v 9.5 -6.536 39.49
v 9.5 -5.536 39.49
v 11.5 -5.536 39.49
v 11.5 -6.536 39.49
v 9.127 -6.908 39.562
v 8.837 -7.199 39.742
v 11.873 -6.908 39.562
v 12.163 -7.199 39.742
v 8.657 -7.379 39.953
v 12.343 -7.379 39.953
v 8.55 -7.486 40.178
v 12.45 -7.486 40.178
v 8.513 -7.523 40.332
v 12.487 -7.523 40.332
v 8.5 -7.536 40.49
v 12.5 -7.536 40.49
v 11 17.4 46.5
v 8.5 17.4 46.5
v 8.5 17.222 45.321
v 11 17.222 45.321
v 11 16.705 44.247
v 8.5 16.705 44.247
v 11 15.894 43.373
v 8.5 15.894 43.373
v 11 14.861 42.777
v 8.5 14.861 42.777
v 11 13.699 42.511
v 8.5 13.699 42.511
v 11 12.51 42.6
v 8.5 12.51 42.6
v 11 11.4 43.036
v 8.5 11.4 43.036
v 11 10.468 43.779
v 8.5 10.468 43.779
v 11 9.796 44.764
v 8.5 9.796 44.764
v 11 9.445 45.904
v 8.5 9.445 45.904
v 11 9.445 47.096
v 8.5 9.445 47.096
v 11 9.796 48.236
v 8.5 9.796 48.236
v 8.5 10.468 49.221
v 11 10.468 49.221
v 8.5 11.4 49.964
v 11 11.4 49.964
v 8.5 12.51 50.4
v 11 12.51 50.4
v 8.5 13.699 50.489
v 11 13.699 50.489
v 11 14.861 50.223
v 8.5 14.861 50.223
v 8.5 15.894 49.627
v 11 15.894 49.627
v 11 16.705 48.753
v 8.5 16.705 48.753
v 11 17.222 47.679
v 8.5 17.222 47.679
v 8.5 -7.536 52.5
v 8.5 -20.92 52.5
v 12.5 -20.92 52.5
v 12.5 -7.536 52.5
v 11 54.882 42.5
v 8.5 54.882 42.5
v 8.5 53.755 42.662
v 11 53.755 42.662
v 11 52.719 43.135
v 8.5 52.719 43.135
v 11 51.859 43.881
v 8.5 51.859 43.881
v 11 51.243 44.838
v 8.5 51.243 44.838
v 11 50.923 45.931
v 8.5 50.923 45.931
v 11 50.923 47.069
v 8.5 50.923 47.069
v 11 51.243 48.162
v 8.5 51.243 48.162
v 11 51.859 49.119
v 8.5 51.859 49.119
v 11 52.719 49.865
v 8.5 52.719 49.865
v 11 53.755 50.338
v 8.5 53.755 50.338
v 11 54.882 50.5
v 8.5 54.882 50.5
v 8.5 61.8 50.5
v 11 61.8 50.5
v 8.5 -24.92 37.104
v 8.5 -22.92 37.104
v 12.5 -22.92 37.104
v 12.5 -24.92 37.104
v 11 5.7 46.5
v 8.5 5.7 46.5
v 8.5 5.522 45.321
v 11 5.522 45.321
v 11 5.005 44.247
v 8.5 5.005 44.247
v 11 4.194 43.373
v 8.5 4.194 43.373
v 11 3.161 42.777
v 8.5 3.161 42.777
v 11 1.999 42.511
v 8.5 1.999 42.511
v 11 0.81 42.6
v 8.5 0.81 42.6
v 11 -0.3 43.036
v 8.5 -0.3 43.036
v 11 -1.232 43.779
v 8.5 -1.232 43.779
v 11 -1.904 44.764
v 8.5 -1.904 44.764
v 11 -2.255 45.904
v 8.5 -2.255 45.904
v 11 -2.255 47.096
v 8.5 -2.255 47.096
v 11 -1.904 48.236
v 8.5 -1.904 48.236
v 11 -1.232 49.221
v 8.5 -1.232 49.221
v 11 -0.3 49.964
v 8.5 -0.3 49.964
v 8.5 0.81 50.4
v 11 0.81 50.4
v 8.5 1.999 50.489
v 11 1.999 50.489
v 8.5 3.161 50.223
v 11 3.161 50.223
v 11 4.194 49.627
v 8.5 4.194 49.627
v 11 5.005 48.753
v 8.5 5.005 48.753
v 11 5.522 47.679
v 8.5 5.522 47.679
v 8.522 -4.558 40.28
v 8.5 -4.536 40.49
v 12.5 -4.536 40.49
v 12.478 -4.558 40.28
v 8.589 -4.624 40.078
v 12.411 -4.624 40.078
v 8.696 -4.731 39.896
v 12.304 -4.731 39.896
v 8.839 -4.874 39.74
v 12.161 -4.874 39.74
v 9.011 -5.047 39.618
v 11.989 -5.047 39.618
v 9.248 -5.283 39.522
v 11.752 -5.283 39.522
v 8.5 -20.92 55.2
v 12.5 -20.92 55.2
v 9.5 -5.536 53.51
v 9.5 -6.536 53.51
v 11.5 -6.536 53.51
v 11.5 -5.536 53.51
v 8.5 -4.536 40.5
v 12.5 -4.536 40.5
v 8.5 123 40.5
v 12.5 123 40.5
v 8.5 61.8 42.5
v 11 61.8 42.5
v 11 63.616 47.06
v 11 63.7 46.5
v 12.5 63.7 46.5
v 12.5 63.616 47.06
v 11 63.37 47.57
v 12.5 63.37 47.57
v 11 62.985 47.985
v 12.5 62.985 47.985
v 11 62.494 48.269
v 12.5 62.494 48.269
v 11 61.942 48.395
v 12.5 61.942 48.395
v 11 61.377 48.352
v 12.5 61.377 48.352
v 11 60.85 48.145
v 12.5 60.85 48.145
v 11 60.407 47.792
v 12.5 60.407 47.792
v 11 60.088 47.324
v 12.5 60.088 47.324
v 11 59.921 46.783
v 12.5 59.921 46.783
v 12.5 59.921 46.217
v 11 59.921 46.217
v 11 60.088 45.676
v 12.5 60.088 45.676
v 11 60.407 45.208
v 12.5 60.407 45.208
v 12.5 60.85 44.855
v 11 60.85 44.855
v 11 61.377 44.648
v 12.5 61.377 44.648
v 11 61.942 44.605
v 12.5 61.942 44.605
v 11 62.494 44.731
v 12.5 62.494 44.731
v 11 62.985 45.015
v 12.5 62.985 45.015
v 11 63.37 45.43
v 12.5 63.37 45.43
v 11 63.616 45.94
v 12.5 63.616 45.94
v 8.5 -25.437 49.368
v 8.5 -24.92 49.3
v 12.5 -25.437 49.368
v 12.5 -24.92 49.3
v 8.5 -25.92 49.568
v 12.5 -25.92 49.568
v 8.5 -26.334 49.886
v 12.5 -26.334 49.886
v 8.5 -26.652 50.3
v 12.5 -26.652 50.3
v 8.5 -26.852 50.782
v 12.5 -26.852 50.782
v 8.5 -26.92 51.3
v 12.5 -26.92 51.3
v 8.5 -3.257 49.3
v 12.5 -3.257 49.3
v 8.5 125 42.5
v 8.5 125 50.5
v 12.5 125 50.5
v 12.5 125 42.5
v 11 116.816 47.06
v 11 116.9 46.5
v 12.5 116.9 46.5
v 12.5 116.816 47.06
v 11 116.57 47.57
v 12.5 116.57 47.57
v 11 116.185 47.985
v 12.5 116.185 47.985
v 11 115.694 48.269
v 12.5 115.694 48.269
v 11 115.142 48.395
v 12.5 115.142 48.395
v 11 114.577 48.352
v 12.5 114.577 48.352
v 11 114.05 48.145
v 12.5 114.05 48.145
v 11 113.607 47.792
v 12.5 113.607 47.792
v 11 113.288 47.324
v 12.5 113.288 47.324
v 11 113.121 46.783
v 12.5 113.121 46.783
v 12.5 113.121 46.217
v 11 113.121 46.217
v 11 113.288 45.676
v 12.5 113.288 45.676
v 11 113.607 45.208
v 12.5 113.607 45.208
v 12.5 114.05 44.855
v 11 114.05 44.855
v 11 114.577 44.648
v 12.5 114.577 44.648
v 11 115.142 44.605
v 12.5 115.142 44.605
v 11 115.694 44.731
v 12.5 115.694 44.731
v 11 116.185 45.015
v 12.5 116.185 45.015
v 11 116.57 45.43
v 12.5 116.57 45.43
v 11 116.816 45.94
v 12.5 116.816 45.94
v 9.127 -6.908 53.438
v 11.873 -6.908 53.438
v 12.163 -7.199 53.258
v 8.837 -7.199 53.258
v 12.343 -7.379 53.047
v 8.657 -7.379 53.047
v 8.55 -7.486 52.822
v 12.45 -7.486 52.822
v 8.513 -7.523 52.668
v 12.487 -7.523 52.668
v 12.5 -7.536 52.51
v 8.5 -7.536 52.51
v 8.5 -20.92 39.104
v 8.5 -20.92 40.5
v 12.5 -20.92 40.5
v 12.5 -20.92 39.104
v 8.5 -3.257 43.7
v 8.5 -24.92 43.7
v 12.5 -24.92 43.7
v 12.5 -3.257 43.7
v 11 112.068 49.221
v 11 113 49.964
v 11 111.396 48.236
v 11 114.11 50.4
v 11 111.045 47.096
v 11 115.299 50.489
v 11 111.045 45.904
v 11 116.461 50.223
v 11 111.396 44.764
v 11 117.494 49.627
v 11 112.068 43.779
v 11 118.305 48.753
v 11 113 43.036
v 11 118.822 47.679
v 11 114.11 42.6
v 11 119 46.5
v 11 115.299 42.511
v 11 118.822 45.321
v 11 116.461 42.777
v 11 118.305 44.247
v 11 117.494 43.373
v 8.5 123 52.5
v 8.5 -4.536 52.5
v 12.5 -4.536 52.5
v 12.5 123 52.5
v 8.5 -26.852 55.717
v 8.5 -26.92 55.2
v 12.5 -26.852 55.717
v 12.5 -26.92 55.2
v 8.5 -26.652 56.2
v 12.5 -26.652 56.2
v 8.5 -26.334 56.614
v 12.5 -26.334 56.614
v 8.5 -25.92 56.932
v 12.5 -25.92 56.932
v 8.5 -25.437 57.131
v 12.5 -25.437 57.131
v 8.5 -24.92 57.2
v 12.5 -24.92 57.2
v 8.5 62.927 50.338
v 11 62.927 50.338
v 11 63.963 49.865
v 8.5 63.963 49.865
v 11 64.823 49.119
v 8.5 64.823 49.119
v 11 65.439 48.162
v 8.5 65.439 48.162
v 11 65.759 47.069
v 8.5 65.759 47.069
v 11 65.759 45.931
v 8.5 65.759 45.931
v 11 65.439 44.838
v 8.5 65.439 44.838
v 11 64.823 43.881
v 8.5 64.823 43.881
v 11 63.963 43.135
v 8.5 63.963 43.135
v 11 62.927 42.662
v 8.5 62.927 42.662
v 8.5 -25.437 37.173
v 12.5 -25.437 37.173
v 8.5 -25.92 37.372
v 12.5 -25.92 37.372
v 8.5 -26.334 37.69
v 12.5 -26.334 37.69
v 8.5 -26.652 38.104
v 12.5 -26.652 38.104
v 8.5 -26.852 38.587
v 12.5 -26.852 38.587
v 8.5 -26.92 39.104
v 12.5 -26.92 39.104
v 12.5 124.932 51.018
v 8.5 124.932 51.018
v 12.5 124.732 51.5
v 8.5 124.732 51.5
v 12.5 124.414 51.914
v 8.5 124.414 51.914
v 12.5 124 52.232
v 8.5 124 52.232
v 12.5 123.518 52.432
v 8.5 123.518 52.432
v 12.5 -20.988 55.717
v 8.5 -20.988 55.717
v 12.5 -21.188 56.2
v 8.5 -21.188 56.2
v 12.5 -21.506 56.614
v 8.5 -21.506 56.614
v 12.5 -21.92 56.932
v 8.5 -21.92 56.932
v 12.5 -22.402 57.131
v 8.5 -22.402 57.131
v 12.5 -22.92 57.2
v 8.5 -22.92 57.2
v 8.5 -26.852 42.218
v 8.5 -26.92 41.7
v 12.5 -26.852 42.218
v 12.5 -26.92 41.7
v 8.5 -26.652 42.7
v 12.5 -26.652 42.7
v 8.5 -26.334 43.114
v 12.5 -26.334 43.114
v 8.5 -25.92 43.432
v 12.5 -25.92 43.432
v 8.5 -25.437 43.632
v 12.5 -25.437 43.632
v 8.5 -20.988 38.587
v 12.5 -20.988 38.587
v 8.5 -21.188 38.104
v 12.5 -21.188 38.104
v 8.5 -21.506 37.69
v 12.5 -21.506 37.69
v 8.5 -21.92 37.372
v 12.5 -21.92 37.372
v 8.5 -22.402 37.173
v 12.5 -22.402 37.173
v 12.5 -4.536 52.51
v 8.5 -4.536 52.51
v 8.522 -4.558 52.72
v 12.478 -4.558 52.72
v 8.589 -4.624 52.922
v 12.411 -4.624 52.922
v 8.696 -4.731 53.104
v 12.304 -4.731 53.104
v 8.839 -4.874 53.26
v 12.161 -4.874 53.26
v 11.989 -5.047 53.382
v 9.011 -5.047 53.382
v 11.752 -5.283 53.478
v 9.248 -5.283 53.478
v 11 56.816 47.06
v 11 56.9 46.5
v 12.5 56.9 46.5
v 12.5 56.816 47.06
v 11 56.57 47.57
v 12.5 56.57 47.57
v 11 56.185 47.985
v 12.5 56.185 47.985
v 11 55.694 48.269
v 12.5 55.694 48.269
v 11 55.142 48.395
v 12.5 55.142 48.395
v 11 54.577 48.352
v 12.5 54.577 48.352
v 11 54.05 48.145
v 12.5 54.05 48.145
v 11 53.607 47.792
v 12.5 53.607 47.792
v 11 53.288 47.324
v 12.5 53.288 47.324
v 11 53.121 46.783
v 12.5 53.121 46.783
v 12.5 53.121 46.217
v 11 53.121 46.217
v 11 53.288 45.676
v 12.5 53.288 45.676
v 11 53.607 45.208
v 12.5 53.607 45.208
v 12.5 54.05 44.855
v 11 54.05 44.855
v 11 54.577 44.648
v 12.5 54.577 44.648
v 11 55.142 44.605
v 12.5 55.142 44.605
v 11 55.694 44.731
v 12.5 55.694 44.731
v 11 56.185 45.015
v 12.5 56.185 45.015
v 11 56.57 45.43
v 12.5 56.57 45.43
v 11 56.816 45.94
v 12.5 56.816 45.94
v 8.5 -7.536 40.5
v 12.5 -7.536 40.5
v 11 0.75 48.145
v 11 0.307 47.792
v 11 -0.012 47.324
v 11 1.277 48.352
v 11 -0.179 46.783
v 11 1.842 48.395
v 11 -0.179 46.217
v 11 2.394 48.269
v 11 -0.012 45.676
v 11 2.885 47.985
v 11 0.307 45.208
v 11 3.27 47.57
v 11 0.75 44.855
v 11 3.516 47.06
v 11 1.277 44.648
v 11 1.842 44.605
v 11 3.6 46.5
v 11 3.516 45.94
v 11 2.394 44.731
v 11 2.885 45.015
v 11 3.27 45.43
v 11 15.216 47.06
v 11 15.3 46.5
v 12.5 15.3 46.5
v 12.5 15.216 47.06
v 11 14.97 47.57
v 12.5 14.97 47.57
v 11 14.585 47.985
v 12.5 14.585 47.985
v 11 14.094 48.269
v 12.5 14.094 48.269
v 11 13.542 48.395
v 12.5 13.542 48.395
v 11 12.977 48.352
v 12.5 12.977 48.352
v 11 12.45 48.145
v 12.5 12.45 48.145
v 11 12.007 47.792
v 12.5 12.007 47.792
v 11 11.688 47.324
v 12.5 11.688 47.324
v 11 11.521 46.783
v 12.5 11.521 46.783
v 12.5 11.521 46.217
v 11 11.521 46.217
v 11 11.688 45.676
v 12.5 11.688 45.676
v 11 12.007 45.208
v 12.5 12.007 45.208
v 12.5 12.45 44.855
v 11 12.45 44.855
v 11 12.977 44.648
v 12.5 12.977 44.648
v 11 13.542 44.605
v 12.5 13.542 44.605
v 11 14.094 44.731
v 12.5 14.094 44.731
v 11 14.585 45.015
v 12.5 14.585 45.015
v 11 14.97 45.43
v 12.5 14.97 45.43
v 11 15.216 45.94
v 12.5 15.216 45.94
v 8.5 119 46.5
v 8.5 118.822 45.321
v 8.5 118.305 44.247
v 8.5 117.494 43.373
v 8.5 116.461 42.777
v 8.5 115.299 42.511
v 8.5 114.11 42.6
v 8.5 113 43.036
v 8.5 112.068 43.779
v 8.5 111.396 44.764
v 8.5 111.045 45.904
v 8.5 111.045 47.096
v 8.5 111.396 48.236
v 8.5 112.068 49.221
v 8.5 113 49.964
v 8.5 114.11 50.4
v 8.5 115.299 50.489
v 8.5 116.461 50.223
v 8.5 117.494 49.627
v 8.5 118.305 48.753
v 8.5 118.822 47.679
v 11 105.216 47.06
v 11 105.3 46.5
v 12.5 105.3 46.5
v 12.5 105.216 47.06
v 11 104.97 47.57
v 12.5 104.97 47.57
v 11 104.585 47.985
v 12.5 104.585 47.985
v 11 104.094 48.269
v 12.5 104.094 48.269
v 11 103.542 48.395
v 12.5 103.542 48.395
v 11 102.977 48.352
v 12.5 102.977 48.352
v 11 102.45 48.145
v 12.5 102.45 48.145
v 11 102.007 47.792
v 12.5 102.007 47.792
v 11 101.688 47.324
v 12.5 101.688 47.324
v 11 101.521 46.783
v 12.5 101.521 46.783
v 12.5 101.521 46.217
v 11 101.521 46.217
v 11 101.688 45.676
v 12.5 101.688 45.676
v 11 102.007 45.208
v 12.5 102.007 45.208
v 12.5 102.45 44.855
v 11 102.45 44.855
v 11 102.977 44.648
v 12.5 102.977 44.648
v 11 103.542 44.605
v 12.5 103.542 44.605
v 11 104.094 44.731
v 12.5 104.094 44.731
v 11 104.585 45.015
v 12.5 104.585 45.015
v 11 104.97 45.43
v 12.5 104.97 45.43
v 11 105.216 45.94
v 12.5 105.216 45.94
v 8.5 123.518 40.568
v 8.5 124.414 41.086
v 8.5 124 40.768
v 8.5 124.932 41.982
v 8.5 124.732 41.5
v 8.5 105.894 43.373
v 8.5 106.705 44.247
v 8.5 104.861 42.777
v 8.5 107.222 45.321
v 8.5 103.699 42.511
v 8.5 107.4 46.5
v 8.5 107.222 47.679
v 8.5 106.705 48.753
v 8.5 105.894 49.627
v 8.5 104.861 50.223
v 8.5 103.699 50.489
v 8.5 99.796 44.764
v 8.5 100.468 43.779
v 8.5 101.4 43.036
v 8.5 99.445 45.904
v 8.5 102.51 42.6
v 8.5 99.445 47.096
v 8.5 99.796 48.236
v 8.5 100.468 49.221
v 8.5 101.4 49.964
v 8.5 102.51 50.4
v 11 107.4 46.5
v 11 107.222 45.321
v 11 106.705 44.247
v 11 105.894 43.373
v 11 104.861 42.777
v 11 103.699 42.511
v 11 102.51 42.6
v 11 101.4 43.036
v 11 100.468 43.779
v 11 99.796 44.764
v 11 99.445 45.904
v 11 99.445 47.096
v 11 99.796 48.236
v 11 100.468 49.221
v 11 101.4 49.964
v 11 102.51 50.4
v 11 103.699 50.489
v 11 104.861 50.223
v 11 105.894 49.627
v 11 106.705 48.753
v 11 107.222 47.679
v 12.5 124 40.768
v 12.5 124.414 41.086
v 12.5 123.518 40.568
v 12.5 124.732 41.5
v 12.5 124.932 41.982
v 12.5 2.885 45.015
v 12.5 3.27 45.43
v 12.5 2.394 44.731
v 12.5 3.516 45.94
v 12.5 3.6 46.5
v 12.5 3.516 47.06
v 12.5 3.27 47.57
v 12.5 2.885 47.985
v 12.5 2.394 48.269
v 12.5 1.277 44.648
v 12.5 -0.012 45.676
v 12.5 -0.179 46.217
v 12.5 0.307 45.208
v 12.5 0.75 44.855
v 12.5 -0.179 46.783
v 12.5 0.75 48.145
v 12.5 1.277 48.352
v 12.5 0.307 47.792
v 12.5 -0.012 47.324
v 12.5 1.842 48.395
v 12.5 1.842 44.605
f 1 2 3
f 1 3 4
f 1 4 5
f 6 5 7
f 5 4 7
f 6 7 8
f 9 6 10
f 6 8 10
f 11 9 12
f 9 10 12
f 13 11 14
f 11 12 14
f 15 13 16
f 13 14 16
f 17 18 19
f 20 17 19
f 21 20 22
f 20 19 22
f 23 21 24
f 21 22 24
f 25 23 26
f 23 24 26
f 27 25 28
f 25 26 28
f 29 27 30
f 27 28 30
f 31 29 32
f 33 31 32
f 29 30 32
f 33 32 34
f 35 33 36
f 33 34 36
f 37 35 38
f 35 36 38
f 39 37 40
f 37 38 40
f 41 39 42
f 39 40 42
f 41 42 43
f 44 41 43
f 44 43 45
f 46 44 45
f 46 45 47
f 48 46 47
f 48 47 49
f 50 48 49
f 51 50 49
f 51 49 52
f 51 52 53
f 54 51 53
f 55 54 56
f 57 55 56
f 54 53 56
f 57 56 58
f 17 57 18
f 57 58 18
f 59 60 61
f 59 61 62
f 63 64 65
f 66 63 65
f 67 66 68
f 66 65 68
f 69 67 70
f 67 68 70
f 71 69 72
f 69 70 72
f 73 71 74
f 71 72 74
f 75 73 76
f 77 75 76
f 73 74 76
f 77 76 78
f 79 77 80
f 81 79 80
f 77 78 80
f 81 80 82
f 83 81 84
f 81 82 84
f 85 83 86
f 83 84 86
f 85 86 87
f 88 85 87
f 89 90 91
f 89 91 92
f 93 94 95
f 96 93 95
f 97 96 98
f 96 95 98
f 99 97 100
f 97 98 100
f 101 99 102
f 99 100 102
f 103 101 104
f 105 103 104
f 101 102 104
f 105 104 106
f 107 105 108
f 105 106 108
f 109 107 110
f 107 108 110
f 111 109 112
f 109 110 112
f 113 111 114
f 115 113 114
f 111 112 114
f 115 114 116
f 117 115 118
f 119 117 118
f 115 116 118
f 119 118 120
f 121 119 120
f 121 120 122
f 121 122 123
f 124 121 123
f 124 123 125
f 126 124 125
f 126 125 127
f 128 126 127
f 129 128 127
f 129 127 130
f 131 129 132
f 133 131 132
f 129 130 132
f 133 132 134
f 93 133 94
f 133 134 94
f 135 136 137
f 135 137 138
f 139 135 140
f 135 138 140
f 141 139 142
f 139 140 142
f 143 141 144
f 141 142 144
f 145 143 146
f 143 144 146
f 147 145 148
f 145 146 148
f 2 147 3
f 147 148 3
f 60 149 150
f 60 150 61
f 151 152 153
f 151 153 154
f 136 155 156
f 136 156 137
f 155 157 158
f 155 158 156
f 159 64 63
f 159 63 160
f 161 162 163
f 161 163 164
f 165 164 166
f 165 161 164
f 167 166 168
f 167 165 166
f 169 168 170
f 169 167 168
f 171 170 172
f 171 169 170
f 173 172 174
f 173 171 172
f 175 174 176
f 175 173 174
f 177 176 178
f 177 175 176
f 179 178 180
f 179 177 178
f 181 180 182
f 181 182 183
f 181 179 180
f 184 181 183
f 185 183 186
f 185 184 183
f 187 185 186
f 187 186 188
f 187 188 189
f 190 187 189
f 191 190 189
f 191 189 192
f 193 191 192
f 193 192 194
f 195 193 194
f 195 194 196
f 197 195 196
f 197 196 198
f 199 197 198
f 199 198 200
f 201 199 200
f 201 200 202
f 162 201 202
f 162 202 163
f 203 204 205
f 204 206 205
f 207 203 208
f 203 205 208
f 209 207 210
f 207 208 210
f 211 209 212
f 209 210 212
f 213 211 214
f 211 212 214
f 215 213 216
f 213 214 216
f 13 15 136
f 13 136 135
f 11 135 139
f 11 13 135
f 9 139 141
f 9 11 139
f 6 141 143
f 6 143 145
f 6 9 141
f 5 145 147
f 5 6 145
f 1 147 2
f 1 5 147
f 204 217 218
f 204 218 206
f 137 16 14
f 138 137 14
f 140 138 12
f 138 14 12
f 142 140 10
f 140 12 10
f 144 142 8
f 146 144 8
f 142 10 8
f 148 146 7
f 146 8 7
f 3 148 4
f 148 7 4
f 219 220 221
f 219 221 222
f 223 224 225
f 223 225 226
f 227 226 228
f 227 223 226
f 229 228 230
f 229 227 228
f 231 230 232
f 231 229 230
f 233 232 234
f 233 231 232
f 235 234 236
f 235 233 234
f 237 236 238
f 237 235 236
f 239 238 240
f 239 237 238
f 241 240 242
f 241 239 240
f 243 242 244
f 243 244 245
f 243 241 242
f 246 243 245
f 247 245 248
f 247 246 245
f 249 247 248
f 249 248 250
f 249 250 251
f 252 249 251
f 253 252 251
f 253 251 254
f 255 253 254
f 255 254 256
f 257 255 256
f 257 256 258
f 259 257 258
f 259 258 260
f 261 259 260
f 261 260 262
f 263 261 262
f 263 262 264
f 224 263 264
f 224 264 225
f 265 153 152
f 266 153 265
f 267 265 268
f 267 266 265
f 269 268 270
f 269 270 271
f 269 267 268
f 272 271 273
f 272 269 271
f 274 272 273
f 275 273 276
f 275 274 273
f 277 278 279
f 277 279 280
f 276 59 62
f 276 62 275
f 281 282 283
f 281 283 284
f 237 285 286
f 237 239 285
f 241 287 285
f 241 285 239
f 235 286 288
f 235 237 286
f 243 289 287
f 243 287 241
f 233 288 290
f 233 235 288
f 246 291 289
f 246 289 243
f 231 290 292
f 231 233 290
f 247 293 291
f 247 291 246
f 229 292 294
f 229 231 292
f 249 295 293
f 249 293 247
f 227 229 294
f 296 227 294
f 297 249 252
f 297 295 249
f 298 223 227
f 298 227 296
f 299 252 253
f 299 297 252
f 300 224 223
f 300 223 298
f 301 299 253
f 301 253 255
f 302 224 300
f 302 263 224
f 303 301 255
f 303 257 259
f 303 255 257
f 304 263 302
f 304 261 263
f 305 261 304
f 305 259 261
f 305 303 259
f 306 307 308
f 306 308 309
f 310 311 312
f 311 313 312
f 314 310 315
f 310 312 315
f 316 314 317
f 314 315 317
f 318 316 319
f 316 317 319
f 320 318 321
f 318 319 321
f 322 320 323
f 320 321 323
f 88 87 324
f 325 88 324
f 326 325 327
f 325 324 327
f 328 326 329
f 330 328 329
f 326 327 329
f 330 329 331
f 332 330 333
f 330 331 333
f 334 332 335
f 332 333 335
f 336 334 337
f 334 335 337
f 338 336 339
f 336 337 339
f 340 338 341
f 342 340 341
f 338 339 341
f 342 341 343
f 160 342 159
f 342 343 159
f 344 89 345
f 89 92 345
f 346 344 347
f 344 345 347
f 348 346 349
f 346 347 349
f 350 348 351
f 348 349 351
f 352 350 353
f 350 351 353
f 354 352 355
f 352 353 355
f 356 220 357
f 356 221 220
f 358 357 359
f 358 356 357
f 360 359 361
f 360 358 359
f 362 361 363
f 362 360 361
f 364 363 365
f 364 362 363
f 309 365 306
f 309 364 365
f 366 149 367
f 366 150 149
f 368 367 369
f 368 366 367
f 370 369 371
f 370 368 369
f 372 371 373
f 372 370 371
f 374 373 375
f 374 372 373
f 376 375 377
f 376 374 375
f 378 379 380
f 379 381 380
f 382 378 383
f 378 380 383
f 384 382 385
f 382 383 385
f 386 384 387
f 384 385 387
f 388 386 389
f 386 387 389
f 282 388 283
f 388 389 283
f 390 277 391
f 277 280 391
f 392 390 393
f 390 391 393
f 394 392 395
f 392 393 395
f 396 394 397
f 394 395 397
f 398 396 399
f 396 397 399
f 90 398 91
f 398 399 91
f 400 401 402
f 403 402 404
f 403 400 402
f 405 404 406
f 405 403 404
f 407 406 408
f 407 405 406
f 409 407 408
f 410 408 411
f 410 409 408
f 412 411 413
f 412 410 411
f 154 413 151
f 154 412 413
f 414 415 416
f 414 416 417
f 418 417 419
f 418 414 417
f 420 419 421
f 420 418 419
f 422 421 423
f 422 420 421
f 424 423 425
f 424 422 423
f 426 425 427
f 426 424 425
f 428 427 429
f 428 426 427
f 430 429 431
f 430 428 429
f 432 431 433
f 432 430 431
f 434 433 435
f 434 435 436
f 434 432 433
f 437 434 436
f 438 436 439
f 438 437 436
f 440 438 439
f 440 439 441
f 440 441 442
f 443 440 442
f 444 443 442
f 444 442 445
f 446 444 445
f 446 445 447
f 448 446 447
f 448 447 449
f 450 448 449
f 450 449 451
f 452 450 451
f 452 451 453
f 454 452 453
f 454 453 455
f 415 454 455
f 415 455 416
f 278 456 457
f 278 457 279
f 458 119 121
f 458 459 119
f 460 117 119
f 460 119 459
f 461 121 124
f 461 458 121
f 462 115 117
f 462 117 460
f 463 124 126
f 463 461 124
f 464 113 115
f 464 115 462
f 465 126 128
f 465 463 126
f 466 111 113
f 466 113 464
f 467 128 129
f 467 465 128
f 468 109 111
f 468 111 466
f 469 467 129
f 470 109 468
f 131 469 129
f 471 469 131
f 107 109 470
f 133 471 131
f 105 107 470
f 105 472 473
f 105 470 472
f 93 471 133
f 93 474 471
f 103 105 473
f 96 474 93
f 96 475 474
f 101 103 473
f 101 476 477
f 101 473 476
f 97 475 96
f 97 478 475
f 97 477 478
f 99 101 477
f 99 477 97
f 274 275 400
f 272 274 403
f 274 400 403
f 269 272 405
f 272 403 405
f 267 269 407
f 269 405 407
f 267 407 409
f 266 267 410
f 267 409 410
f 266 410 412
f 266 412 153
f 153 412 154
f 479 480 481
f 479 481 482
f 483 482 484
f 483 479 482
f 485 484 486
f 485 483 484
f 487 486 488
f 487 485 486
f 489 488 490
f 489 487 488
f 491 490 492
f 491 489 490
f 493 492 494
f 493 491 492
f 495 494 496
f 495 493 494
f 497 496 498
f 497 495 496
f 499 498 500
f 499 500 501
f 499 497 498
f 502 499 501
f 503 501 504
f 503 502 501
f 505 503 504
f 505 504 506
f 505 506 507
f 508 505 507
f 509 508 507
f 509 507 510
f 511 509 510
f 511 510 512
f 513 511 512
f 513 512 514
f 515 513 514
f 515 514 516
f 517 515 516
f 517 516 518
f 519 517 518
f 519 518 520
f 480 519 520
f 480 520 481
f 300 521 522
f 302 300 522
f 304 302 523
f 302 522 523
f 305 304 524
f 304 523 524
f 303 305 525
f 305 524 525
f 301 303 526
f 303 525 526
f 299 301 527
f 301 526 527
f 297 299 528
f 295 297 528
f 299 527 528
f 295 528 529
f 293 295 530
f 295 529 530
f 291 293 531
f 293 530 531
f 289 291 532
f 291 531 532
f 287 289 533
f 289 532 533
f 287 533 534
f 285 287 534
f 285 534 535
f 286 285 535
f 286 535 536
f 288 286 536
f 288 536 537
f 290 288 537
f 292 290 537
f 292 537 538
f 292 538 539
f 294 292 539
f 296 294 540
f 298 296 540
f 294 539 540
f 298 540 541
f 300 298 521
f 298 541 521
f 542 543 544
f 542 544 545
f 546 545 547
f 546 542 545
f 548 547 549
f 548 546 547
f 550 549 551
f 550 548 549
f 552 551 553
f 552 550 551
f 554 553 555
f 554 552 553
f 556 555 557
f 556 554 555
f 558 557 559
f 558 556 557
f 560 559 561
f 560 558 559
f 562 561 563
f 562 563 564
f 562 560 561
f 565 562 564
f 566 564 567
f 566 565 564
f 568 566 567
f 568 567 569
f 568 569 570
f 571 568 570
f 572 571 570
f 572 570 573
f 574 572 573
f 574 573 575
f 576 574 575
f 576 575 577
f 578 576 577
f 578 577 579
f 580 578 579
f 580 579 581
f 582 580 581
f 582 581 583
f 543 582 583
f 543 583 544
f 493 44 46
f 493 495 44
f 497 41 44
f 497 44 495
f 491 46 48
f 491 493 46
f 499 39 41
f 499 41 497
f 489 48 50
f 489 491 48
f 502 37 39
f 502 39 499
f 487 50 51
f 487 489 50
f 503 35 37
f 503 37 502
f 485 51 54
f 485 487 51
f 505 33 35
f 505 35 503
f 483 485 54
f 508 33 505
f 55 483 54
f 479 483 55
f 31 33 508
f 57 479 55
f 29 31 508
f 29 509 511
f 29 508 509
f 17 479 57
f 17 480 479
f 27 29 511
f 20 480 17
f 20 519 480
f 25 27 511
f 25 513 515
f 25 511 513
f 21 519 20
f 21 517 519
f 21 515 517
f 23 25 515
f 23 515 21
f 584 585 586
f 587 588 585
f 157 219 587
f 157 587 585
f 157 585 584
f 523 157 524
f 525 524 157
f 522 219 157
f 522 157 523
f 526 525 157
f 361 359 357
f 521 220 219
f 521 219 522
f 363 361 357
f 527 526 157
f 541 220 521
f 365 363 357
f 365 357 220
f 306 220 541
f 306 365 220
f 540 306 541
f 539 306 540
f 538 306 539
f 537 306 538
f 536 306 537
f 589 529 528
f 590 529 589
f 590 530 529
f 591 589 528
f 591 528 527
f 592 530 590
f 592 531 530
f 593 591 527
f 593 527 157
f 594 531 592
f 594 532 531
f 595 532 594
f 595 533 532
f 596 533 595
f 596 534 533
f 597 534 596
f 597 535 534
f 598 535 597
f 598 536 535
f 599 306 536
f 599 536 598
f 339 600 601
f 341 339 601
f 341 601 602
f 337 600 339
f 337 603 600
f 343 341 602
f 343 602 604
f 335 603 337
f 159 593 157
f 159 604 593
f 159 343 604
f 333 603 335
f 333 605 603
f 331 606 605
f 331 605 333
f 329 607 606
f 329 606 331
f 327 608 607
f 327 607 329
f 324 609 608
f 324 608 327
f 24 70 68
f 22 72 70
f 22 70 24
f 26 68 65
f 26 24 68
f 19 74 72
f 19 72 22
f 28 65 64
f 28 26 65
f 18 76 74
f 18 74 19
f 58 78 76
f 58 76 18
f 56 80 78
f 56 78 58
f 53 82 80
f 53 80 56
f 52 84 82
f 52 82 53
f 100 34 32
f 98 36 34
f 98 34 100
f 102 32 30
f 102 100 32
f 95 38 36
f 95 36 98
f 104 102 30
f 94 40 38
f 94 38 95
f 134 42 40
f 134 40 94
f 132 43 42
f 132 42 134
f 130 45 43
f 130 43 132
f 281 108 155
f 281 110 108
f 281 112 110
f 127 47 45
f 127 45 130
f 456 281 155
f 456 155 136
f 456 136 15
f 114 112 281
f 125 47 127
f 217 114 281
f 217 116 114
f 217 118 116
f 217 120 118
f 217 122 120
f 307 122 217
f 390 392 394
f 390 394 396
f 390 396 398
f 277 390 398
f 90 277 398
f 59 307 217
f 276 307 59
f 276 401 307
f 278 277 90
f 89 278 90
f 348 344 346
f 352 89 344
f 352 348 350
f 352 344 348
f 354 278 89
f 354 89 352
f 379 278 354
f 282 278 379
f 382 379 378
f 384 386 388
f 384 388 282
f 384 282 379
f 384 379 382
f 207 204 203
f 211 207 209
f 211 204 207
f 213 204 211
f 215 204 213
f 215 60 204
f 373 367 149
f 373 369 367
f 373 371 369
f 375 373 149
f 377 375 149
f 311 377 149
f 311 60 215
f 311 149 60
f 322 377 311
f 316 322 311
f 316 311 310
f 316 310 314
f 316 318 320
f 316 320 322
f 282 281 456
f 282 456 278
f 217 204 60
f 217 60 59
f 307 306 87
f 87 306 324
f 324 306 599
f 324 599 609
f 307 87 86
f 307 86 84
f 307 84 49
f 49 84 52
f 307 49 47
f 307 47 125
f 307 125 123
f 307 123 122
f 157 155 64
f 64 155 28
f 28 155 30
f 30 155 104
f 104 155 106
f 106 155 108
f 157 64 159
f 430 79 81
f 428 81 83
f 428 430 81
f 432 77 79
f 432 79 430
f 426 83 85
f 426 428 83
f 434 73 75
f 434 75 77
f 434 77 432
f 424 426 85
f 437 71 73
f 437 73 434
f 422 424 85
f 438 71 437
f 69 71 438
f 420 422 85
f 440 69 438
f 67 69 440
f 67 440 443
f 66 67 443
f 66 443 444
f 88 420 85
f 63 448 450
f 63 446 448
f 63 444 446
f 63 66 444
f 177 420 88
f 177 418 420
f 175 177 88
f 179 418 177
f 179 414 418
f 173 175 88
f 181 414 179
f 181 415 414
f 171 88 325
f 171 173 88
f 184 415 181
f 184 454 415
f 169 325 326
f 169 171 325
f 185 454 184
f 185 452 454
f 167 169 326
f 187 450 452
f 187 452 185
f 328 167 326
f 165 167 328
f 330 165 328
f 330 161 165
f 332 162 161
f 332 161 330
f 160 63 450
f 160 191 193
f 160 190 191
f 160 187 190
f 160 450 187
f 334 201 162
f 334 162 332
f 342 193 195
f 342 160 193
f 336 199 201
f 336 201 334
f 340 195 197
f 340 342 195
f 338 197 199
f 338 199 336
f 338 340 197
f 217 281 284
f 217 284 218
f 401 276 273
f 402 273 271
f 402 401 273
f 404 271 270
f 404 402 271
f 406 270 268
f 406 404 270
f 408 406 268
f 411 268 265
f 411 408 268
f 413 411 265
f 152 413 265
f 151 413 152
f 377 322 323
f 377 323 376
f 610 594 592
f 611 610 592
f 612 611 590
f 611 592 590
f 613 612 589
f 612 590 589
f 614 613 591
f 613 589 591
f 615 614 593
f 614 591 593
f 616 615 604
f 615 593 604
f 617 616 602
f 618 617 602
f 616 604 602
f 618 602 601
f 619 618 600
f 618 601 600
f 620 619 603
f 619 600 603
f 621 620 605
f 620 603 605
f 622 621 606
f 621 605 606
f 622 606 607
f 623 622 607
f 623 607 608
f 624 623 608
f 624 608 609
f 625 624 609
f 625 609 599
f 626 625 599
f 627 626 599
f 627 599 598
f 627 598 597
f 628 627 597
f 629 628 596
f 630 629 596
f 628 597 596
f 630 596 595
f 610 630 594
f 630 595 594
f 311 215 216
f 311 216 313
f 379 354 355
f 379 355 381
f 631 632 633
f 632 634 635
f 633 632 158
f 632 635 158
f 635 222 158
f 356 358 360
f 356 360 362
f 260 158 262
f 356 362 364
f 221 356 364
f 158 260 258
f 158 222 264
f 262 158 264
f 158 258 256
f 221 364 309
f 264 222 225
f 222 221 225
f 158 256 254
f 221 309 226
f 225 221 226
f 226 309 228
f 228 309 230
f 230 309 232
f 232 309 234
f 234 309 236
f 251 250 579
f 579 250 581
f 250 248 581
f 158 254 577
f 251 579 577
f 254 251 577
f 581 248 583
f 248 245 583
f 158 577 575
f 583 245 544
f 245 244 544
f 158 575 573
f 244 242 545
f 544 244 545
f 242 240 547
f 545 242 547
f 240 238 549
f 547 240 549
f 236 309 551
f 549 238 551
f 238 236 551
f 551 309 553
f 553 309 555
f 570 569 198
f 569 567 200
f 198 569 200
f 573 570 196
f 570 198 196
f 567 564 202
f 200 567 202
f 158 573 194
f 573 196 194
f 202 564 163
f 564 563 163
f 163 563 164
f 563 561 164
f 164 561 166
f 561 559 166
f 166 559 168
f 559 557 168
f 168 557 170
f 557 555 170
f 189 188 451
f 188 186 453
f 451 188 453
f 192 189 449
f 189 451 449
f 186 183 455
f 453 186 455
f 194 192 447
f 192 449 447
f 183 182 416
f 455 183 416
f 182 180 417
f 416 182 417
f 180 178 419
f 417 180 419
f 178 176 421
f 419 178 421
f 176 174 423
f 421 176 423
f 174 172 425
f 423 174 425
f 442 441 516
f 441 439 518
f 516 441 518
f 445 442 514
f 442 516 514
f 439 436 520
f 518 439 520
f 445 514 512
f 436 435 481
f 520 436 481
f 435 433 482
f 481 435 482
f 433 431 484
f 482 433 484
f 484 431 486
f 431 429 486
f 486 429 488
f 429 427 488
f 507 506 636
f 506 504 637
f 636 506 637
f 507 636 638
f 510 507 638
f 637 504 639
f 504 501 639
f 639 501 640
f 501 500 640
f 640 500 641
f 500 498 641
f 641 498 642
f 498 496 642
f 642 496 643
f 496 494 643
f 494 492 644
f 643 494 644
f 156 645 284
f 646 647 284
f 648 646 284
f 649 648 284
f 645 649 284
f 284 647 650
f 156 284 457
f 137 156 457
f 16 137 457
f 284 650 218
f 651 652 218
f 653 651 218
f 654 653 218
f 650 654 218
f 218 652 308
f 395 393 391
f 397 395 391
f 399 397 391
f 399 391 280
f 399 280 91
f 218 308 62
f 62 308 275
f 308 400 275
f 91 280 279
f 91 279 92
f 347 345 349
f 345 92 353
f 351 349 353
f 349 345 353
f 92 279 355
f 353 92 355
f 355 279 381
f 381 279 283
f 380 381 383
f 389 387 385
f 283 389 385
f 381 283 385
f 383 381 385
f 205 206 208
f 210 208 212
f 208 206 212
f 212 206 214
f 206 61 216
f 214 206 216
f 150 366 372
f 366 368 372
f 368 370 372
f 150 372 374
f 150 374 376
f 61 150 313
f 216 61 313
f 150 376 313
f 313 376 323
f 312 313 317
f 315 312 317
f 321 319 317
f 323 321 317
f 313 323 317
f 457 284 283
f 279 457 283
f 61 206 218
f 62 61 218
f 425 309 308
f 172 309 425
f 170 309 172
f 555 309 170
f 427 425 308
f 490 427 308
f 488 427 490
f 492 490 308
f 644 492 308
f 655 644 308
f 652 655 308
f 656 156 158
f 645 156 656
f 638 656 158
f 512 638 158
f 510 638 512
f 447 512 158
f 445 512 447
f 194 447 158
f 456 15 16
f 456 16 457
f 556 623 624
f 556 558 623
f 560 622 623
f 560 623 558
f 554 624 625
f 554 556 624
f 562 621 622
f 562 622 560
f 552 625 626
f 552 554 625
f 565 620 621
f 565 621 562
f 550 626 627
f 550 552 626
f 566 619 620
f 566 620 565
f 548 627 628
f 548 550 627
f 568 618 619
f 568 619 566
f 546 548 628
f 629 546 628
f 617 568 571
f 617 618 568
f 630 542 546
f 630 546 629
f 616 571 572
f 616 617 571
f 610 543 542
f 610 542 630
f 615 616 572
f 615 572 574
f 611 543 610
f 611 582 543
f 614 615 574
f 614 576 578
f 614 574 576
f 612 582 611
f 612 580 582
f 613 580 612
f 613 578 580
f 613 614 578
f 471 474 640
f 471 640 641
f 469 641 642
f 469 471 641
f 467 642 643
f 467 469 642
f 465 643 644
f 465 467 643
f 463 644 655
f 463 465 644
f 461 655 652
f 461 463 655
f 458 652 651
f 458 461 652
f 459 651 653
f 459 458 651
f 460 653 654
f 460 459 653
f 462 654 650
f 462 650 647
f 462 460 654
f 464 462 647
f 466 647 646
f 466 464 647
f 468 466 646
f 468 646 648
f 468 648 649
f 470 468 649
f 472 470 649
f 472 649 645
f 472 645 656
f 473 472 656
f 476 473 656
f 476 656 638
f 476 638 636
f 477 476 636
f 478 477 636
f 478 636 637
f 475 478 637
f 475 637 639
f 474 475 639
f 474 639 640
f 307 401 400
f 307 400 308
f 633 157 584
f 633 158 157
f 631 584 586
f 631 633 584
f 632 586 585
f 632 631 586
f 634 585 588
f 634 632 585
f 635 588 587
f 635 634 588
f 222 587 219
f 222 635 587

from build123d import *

# Parameters (mm, degrees)
SKETCH062_R             = 1.9
PAD020_DEPTH            = 4
SKETCH063_R             = 4
POCKET042_DEPTH         = 2.5
FILLET015_R             = 2
FILLET016_R             = 1
FILLET017_R             = 2
BODY016_PLACEMENT_ANGLE = 270


with BuildPart() as part:
    # Sketch062 → Pad020 (new body)
    with BuildSketch(Plane.XZ):
        Polygon((4, 0), (-125.535636, 0), (-125.535636, -1.01), (-128.535636, -1.01), (-128.535636, 0), (-141.91974, 0), (-141.91974, -3.395505), (-147.91974, -3.395505), (-147.91974, 3.2), (-124.257385, 3.2), (-124.257385, 8.8), (-147.91974, 8.8), (-147.91974, 16.699631), (-141.91974, 16.699631), (-141.91974, 12), (-128.535636, 12), (-128.535636, 13.01), (-125.535636, 13.01), (-125.535636, 12), (4, 12), align=None)
        with Locations((-66, 6)):
            Circle(SKETCH062_R, mode=Mode.SUBTRACT)
        with Locations((-6, 6)):
            Circle(SKETCH062_R, mode=Mode.SUBTRACT)
        with Locations((-107.6, 6)):
            Circle(SKETCH062_R, mode=Mode.SUBTRACT)
        with Locations((-17.6, 6)):
            Circle(SKETCH062_R, mode=Mode.SUBTRACT)
        with Locations((-59.2, 6)):
            Circle(SKETCH062_R, mode=Mode.SUBTRACT)
        with Locations((-119.3, 6)):
            Circle(SKETCH062_R, mode=Mode.SUBTRACT)
    extrude(amount=PAD020_DEPTH)

    # Sketch063 (on Face27 of Pad020) → Pocket042 (cut)
    with BuildSketch(Plane(origin=(0, 0, 0), x_dir=(1, 0, 0), z_dir=(0, 1, 0))):
        with Locations((-107.6, -6)):
            Circle(SKETCH063_R)
        with Locations((-6, -6)):
            Circle(SKETCH063_R)
        with Locations((-17.6, -6)):
            Circle(SKETCH063_R)
        with Locations((-119.3, -6)):
            Circle(SKETCH063_R)
        with BuildLine():
            ThreePointArc((-66.1179939879, -2), (-70.1179939879, -6), (-66.1179939879, -10))
            Line((-66.1179939879, -10), (-59.2, -10))
            ThreePointArc((-59.2, -10), (-55.2, -6), (-59.2, -2))
            Line((-66.1179939879, -2), (-59.2, -2))
        make_face()
    extrude(amount=-POCKET042_DEPTH, mode=Mode.SUBTRACT)

    # Fillet015
    fillet015_edges = [part.edges().sort_by_distance(p)[0] for p in [
        (4, -2, 12),
        (4, -2, 0),
    ]]
    fillet(fillet015_edges, radius=FILLET015_R)

    # Fillet016
    fillet016_edges = [part.edges().sort_by_distance(p)[0] for p in [
        (-125.535636, -2, -1.01),
        (-128.535636, -2, -1.01),
        (-127.035636, 0, -1.01),
        (-127.035636, -4, -1.01),
        (-128.535636, -2, 13.01),
        (-125.535636, -2, 13.01),
        (-127.035636, 0, 13.01),
        (-127.035636, -4, 13.01),
    ]]
    fillet(fillet016_edges, radius=FILLET016_R)

    # Fillet017
    fillet017_edges = [part.edges().sort_by_distance(p)[0] for p in [
        (-141.91974, -2, 16.699631),
        (-147.91974, -2, 16.699631),
        (-147.91974, -2, 8.8),
        (-147.91974, -2, 3.2),
        (-147.91974, -2, -3.395505),
        (-141.91974, -2, -3.395505),
    ]]
    fillet(fillet017_edges, radius=FILLET017_R)


with BuildPart() as part_1:
    # Body016 placement: moved
    add(part.part.moved(Location((8.5, 121, 40.5))).rotate(Axis((8.5, 121, 40.5), (0, 0, -1)), BODY016_PLACEMENT_ANGLE))


solid = part_1.part
